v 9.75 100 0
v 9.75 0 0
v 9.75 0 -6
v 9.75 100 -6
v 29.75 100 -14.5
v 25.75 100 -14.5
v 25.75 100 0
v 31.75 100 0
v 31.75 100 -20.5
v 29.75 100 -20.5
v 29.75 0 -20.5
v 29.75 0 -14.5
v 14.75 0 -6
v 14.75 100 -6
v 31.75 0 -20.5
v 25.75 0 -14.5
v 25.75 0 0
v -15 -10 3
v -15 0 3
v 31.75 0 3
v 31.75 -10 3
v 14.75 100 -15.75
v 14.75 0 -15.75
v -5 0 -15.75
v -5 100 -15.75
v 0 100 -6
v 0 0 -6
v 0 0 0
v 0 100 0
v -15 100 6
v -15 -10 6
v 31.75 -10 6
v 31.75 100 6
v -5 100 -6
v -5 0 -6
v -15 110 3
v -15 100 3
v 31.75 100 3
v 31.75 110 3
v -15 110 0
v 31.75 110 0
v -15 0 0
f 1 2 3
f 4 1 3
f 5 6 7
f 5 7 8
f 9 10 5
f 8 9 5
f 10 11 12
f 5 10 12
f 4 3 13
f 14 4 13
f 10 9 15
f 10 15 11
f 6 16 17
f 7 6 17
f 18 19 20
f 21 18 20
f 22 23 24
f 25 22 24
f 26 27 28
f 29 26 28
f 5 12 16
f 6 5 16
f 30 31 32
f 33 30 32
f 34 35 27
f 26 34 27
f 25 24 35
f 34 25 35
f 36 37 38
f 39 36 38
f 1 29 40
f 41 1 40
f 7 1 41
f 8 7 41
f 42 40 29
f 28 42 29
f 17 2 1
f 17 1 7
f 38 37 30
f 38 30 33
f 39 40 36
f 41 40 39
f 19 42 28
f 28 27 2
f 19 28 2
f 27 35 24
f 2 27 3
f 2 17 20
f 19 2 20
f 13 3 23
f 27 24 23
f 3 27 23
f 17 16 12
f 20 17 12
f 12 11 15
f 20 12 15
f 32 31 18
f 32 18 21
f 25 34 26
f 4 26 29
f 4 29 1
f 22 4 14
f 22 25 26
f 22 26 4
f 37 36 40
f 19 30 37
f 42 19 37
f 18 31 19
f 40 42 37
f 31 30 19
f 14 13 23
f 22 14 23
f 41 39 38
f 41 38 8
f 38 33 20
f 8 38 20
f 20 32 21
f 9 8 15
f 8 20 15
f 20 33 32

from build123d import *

# Parameters (mm, degrees)
BOSS_EXTRUDE1_DEPTH = 100
SKETCH2_W           = 46.75
SKETCH2_H           = 3
BOSS_EXTRUDE2_DEPTH = 10
SKETCH3_W           = 46.75
SKETCH3_H           = 3
BOSS_EXTRUDE3_DEPTH = 10


with BuildPart() as part:
    # Sketch1 → Boss-Extrude1 (new body)
    with BuildSketch(Plane(origin=(0, 0, 0), x_dir=(1, 0, 0), z_dir=(0, 1, 0))):
        Polygon((0, 6), (0, 0), (-15, 0), (-15, -6), (4.875, -6), (4.875, 15.75), (-5, 15.75), (-5, 6), align=None)
        Polygon((4.875, 15.75), (4.875, -6), (24.75, -6), (31.75, -6), (31.75, 20.5), (29.75, 20.5), (29.75, 14.5), (25.75, 14.5), (25.75, 0), (9.75, 0), (9.75, 6), (14.75, 6), (14.75, 15.75), align=None)
    extrude(amount=BOSS_EXTRUDE1_DEPTH)

    # Sketch2 → Boss-Extrude2 (add)
    with BuildSketch(Plane.XZ):
        with Locations((8.375, 4.5)):
            Rectangle(SKETCH2_W, SKETCH2_H)
    extrude(amount=BOSS_EXTRUDE2_DEPTH)

    # Sketch3 → Boss-Extrude3 (add)
    with BuildSketch(Plane(origin=(0, 100, 0), x_dir=(1, 0, 0), z_dir=(0, 1, 0))):
        with Locations((8.375, -1.5)):
            Rectangle(SKETCH3_W, SKETCH3_H)
    extrude(amount=BOSS_EXTRUDE3_DEPTH)


solid = part.part
